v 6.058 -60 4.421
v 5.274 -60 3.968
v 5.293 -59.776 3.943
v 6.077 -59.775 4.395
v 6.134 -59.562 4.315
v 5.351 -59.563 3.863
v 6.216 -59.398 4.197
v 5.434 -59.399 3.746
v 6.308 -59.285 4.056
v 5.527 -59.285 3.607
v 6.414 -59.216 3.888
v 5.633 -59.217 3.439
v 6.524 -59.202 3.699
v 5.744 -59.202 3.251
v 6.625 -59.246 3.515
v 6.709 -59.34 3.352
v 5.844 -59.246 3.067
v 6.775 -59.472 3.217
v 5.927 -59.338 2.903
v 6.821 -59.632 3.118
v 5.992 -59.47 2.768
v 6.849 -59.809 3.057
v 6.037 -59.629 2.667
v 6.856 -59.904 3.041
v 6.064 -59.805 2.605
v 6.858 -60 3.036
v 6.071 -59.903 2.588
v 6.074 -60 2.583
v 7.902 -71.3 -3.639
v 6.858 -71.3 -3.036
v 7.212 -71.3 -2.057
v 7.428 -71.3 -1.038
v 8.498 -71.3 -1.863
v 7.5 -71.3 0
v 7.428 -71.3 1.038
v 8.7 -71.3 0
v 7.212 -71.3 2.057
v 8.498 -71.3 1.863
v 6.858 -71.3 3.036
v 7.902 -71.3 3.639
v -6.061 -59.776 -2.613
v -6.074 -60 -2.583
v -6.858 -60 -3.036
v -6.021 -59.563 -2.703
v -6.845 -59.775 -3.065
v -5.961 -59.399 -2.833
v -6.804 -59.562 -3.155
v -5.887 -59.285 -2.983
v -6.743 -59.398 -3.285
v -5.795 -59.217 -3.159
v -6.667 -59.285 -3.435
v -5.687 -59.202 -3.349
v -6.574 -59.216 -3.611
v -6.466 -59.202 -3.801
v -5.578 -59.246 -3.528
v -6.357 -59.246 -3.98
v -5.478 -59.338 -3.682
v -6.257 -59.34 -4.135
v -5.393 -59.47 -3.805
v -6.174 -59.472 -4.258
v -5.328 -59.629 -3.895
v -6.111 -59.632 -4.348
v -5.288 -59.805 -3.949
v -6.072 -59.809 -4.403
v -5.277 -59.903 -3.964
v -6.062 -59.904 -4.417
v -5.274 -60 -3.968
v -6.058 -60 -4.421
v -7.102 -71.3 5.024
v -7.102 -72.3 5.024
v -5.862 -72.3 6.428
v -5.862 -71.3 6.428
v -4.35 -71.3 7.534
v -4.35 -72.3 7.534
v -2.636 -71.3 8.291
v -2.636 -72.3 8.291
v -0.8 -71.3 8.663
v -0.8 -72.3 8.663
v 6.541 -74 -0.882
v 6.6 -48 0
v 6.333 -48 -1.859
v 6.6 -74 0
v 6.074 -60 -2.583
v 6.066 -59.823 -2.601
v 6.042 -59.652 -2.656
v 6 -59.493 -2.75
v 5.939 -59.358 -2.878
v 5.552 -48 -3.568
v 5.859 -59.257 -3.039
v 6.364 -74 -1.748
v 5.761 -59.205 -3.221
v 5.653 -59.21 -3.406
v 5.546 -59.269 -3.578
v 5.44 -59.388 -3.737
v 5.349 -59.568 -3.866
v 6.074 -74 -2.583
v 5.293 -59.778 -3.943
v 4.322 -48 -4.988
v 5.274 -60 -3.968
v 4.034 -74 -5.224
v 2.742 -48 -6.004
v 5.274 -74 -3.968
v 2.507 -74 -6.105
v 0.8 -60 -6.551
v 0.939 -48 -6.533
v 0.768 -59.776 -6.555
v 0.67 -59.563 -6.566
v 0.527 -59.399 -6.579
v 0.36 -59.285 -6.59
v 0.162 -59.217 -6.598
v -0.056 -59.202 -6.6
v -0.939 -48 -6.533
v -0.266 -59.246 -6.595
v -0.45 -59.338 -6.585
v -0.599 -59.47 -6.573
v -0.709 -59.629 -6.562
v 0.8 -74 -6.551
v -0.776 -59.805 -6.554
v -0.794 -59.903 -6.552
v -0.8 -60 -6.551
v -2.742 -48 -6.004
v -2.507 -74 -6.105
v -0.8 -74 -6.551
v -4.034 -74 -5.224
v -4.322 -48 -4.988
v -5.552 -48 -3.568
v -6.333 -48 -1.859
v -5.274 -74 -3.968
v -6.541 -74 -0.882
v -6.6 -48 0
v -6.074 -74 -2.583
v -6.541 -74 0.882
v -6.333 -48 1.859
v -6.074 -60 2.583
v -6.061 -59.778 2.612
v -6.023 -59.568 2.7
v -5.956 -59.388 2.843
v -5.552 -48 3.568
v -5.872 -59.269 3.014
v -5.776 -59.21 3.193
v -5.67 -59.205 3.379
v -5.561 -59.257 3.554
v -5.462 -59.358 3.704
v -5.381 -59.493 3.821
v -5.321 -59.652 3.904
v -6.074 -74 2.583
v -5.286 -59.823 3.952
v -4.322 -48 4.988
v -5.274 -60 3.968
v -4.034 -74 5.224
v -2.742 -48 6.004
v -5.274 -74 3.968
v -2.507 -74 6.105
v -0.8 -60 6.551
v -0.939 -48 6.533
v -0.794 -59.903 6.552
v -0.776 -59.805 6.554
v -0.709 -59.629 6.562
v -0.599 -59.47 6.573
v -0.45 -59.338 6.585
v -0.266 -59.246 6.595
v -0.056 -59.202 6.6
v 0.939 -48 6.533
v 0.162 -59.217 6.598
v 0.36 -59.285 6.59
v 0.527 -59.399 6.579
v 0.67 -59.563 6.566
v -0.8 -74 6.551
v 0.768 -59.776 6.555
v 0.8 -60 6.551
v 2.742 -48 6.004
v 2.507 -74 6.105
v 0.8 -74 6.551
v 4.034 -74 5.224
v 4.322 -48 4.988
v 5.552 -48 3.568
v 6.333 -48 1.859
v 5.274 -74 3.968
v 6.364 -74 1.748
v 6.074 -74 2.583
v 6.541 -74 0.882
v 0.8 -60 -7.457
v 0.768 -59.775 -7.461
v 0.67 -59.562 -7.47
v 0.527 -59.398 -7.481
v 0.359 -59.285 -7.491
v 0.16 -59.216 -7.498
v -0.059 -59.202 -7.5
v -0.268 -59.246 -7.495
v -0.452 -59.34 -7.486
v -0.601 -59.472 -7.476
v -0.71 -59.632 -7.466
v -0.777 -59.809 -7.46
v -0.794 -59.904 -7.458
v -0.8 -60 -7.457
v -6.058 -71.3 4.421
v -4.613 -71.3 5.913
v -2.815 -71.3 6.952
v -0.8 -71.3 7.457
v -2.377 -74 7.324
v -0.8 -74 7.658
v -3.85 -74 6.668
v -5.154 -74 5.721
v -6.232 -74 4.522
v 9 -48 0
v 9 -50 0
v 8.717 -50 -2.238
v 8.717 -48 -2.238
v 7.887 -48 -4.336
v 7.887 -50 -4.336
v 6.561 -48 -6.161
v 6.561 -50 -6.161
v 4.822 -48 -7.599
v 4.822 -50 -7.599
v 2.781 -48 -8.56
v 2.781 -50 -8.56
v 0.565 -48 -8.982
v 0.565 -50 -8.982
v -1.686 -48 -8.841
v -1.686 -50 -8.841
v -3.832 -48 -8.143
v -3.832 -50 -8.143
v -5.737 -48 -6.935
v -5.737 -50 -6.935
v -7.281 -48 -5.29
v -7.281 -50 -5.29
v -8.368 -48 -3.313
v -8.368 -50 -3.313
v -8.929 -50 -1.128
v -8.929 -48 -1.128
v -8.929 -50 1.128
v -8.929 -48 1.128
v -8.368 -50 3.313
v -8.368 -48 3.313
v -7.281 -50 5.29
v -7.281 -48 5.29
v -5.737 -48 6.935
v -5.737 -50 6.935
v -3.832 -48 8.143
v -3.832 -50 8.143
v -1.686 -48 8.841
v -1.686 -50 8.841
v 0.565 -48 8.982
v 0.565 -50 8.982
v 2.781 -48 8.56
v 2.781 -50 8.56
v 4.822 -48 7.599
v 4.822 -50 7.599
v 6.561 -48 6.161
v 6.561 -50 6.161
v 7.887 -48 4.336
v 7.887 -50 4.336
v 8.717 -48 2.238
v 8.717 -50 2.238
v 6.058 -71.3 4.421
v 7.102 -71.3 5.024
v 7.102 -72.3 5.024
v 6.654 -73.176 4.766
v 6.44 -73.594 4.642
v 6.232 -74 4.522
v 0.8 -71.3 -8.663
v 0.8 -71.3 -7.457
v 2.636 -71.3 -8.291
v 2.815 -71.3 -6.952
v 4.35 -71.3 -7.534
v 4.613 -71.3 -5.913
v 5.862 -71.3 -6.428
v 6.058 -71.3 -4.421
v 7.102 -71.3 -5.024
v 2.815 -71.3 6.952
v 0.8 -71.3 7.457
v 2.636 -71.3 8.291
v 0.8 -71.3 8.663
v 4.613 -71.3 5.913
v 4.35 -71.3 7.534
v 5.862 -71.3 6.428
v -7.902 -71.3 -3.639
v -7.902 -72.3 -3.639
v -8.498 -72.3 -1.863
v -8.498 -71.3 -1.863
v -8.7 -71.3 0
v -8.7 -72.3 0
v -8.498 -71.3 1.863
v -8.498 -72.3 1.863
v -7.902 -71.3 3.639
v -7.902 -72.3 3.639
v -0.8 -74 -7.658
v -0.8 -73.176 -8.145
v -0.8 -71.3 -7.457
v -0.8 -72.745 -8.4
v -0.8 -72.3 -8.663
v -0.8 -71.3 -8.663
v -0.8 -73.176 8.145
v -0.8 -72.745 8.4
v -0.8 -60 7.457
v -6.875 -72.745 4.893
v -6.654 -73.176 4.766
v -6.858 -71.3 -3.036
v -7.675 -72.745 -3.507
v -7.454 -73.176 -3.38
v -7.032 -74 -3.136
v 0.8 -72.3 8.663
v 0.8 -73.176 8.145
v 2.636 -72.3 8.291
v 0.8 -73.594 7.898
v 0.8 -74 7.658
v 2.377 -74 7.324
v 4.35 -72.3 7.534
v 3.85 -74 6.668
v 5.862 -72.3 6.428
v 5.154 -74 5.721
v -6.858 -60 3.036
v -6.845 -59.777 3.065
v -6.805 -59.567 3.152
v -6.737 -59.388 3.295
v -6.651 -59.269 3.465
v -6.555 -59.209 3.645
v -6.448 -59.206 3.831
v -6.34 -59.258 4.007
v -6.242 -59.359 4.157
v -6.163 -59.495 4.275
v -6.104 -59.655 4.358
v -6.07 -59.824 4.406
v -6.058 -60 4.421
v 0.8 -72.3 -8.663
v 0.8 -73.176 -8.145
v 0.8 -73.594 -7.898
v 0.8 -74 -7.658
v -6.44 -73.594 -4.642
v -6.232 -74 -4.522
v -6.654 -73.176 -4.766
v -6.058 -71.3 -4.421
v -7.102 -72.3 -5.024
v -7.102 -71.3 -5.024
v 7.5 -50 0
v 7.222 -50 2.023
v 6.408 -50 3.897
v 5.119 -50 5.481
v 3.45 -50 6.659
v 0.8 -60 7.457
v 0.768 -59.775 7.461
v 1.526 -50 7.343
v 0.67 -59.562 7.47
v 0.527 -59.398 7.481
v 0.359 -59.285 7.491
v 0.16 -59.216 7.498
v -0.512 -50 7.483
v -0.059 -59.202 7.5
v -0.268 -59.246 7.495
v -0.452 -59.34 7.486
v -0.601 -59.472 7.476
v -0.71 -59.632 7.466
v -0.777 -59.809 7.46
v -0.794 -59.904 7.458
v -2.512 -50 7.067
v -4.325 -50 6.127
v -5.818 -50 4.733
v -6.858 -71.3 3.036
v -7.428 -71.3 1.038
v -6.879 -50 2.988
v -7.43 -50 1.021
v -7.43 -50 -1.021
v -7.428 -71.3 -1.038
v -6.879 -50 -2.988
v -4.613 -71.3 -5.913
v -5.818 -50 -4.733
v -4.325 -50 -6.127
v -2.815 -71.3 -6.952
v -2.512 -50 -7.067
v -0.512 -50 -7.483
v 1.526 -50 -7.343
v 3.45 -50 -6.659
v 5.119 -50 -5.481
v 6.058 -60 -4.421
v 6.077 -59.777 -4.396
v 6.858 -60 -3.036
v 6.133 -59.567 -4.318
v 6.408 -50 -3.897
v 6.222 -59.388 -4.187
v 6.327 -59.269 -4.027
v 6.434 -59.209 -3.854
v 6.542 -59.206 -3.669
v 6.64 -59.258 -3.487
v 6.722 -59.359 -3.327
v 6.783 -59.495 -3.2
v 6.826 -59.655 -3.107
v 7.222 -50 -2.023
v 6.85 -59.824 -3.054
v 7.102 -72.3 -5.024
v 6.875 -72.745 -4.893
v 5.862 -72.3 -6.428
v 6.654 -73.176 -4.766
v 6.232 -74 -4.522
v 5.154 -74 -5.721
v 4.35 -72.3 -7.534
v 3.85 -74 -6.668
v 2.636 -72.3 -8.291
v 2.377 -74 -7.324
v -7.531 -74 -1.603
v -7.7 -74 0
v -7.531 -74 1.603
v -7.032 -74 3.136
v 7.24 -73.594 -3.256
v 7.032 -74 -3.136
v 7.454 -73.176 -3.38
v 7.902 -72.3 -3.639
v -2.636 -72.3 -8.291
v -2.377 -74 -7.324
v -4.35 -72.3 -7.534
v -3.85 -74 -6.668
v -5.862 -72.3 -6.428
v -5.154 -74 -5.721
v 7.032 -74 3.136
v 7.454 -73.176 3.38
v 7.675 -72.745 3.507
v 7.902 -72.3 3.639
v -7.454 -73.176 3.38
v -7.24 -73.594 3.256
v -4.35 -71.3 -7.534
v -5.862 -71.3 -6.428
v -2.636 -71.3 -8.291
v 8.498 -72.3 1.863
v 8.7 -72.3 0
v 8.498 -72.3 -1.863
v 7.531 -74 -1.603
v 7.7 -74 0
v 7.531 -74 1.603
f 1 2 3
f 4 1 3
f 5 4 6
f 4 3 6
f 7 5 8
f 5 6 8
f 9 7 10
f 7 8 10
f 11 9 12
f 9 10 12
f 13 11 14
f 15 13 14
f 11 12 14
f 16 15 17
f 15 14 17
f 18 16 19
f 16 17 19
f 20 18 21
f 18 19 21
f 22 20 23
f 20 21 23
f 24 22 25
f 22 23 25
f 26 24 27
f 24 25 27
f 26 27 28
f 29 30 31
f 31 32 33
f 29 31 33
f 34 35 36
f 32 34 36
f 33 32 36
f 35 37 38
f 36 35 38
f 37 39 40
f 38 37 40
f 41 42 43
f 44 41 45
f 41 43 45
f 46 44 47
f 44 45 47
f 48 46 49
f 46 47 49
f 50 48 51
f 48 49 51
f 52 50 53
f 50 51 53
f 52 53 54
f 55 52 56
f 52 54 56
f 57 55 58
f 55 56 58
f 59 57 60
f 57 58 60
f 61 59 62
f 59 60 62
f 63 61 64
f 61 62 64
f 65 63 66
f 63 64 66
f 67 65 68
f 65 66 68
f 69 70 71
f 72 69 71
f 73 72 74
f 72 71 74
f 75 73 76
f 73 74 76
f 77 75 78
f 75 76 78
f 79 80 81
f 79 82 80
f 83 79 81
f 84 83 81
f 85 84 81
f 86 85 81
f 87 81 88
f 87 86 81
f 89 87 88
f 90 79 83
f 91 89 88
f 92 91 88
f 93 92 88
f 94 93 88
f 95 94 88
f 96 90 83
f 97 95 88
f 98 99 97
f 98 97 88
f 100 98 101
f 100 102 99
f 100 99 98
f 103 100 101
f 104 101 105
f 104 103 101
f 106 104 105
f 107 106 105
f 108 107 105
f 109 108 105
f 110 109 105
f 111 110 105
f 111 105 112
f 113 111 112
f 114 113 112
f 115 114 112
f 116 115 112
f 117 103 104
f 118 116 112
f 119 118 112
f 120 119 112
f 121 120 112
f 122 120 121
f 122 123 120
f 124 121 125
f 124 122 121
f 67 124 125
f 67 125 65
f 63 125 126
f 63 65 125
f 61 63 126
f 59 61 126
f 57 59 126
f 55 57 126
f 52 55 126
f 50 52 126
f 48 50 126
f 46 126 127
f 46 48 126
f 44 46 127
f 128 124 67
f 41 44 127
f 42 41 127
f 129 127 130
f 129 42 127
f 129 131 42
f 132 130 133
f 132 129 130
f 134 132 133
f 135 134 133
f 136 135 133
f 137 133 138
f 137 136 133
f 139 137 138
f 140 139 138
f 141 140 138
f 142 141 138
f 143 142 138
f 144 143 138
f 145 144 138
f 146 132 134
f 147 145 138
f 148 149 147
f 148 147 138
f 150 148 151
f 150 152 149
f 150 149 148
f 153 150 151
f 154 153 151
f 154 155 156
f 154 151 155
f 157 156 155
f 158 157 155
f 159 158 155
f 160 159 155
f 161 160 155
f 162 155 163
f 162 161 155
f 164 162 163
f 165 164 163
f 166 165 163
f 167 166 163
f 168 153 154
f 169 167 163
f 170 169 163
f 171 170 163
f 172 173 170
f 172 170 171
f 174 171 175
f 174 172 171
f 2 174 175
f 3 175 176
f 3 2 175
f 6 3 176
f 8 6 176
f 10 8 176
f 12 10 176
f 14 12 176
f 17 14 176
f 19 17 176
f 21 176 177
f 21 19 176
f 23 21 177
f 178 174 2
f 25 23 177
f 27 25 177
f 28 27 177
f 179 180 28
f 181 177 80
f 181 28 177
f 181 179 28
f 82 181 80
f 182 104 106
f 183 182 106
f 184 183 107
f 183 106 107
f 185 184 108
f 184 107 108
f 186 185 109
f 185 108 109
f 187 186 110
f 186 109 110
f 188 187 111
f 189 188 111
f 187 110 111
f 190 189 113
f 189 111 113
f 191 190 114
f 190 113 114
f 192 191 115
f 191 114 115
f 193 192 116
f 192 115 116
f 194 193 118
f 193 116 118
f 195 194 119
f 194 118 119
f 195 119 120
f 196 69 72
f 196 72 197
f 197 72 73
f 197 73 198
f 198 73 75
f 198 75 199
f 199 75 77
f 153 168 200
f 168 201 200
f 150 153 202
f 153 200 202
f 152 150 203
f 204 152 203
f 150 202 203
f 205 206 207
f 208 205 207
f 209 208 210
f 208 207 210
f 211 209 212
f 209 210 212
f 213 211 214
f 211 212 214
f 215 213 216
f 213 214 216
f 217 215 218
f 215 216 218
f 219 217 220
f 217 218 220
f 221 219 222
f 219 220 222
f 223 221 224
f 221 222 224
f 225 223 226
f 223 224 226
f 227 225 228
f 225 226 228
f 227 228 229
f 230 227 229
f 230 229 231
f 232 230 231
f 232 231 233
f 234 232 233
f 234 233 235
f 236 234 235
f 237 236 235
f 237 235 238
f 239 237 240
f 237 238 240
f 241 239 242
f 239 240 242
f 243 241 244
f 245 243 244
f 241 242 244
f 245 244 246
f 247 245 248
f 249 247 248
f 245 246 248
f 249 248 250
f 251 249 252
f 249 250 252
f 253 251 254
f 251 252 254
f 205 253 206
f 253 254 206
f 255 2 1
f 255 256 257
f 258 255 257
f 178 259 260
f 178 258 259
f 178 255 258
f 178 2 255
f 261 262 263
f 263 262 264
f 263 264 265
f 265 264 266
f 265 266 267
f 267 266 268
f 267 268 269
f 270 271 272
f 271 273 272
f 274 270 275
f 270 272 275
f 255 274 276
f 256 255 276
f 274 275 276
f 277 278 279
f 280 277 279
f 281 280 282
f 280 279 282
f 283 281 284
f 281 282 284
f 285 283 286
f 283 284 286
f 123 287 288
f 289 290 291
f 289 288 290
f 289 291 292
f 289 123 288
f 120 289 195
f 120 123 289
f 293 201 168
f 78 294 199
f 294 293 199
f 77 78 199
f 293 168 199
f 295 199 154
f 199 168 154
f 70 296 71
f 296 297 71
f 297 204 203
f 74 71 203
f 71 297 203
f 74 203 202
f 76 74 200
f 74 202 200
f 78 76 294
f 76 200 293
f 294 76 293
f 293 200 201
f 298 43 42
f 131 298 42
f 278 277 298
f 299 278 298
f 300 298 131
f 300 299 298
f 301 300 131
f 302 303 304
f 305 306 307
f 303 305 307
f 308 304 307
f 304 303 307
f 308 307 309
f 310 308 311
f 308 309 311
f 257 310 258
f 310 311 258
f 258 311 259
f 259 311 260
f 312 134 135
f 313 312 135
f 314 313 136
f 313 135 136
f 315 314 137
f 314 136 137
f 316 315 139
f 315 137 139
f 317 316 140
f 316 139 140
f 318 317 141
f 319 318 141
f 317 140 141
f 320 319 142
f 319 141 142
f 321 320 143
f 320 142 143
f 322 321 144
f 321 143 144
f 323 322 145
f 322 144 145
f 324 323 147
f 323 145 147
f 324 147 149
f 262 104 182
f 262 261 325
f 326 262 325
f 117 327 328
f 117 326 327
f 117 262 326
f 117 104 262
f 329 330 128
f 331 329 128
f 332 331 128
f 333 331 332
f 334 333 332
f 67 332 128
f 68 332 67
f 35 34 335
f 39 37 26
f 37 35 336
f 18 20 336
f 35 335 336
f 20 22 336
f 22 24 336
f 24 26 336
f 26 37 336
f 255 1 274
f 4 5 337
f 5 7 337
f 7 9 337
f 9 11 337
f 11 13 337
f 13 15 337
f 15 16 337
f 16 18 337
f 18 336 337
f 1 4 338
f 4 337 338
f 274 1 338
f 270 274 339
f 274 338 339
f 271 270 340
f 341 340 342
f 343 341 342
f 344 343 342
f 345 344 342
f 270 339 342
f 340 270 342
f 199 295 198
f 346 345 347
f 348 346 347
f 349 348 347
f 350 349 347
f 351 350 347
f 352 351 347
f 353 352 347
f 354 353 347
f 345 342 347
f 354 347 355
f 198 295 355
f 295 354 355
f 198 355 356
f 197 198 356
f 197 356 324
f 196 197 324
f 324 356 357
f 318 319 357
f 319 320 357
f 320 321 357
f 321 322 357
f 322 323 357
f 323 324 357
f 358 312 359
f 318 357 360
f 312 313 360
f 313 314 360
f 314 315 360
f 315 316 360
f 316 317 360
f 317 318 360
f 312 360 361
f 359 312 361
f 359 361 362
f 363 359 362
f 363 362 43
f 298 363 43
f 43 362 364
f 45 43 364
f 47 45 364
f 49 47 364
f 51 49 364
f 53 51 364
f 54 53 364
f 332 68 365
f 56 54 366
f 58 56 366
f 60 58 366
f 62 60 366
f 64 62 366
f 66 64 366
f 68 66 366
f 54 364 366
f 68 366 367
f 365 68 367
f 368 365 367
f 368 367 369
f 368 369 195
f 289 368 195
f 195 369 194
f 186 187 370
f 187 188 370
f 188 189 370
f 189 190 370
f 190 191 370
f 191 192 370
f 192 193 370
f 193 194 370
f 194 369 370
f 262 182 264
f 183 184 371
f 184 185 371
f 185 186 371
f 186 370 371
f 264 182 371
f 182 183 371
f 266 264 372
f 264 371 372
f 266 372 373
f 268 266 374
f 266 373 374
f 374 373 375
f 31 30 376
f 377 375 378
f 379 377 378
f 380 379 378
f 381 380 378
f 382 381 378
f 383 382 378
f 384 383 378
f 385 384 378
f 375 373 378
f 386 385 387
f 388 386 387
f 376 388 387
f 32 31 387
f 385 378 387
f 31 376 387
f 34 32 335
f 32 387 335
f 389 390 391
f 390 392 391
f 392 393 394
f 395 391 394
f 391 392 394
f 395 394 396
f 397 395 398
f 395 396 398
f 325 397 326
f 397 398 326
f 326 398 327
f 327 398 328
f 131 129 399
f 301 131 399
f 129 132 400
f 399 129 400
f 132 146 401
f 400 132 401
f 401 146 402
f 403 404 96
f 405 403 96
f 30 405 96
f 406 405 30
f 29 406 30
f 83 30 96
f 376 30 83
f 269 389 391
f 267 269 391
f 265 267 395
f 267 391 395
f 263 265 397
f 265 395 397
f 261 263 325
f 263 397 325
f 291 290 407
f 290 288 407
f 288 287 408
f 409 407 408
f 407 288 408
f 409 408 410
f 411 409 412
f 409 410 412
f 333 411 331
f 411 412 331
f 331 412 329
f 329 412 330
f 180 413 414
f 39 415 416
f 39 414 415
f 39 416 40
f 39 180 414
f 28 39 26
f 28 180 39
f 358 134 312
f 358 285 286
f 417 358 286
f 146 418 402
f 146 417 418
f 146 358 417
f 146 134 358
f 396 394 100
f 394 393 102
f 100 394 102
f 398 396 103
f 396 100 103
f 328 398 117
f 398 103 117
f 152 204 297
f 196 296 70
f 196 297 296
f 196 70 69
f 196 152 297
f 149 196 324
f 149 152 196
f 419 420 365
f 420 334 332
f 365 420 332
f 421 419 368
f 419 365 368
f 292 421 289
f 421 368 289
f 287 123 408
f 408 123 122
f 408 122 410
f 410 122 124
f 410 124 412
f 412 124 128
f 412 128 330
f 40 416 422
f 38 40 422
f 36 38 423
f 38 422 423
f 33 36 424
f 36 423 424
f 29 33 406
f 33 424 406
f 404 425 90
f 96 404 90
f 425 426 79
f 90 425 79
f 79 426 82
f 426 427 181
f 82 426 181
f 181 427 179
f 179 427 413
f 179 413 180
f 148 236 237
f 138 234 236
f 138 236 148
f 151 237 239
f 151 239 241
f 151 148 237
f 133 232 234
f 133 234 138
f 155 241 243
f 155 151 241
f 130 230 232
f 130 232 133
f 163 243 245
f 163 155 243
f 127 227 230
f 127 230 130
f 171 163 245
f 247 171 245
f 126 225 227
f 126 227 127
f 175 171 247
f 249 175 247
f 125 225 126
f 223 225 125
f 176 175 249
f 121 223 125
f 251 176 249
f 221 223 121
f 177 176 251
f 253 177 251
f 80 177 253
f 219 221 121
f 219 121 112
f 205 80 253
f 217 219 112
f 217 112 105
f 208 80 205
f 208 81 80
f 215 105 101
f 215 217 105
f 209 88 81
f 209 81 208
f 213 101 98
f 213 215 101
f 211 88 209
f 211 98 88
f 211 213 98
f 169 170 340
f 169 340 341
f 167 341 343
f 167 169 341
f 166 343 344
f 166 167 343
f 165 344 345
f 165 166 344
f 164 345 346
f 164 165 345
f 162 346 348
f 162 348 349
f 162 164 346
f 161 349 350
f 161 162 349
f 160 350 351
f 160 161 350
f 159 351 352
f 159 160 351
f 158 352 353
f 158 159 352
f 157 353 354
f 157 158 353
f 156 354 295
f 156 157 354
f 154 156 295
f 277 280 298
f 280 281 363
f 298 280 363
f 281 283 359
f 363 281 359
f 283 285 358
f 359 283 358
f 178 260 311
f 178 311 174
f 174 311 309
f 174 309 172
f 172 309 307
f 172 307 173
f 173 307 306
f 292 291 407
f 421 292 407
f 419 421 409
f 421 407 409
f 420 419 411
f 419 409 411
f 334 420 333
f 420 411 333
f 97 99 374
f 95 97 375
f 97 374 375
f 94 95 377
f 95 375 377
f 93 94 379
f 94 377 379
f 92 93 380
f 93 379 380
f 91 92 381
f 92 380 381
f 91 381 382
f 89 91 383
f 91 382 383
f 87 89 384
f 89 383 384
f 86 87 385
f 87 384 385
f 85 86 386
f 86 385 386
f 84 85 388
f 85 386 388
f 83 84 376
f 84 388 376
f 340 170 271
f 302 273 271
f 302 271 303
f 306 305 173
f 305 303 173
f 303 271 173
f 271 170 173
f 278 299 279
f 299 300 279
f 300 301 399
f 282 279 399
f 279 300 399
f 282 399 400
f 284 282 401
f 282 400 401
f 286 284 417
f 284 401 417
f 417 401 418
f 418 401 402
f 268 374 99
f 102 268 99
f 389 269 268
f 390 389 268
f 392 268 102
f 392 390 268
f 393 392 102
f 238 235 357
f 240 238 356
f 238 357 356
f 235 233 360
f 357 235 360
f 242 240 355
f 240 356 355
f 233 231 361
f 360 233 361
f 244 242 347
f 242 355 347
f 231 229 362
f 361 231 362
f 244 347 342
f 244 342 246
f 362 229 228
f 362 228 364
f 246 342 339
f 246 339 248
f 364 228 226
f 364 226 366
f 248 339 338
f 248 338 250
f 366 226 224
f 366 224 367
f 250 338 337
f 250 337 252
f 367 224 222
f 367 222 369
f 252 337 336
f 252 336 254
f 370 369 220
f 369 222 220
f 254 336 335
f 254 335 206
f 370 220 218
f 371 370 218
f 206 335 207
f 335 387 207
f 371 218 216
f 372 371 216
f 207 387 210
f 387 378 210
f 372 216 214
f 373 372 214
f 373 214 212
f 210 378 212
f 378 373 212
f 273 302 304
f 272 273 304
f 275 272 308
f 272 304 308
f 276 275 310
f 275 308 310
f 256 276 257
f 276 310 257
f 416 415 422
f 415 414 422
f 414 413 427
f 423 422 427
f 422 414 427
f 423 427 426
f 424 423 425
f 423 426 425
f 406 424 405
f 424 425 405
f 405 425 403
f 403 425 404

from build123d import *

# Parameters (mm, degrees)
SKETCH008_R          = 7.5
SKETCH008_R_2        = 6.6
PAD002_DEPTH         = 24
SKETCH009_R          = 9
SKETCH009_R_2        = 6.6
PAD003_DEPTH         = 2
POCKET006_DEPTH      = 81.774622
POCKET006_DEPTH_BACK = 81.774622
POLARPATTERN_COUNT   = 3


with BuildPart() as part:
    # Sketch008 (on DatumPlane) → Pad002 (new body)
    with BuildSketch(Plane.XZ.offset(50)):
        Circle(SKETCH008_R)
        Circle(SKETCH008_R_2, mode=Mode.SUBTRACT)
    extrude(amount=PAD002_DEPTH)

    # Sketch009 (on Face3 of Pad002) → Pad003 (join)
    with BuildSketch(Plane(origin=(0, -50, 0), x_dir=(1, 0, 0), z_dir=(0, 1, 0))):
        Circle(SKETCH009_R)
        Circle(SKETCH009_R_2, mode=Mode.SUBTRACT)
    extrude(amount=PAD003_DEPTH)

    # Sketch010 → Revolution (revolve)
    with BuildSketch(Plane.XY):
        Polygon((-7.5, -74), (-7.5, -71.3), (-8.7, -71.3), (-8.7, -72.3), (-7.7, -74), align=None)
    revolve(axis=Axis((0, 0, 0), (0, 1, 0)))

    # Sketch011 → Pocket006 (cut, two sides)
    with BuildSketch(Plane.XY) as pocket006_sk:
        with BuildLine():
            Line((-0.8, -74), (-0.8, -60))
            ThreePointArc((0.8, -60), (0, -59.2), (-0.8, -60))
            Line((0.8, -60), (0.8, -74))
            Line((-0.8, -74), (0.8, -74))
        make_face()
    pocket006 = extrude(amount=-POCKET006_DEPTH, mode=Mode.SUBTRACT) + extrude(pocket006_sk.sketch, amount=POCKET006_DEPTH_BACK, mode=Mode.SUBTRACT)

    # PolarPattern: Pocket006 ×3 about axis
    polarpattern_axis = Axis((0, 0, 0), (0, 1, 0))
    for i in range(1, POLARPATTERN_COUNT):
        add(pocket006.rotate(polarpattern_axis, i * 360 / POLARPATTERN_COUNT), mode=Mode.SUBTRACT)


solid = part.part
